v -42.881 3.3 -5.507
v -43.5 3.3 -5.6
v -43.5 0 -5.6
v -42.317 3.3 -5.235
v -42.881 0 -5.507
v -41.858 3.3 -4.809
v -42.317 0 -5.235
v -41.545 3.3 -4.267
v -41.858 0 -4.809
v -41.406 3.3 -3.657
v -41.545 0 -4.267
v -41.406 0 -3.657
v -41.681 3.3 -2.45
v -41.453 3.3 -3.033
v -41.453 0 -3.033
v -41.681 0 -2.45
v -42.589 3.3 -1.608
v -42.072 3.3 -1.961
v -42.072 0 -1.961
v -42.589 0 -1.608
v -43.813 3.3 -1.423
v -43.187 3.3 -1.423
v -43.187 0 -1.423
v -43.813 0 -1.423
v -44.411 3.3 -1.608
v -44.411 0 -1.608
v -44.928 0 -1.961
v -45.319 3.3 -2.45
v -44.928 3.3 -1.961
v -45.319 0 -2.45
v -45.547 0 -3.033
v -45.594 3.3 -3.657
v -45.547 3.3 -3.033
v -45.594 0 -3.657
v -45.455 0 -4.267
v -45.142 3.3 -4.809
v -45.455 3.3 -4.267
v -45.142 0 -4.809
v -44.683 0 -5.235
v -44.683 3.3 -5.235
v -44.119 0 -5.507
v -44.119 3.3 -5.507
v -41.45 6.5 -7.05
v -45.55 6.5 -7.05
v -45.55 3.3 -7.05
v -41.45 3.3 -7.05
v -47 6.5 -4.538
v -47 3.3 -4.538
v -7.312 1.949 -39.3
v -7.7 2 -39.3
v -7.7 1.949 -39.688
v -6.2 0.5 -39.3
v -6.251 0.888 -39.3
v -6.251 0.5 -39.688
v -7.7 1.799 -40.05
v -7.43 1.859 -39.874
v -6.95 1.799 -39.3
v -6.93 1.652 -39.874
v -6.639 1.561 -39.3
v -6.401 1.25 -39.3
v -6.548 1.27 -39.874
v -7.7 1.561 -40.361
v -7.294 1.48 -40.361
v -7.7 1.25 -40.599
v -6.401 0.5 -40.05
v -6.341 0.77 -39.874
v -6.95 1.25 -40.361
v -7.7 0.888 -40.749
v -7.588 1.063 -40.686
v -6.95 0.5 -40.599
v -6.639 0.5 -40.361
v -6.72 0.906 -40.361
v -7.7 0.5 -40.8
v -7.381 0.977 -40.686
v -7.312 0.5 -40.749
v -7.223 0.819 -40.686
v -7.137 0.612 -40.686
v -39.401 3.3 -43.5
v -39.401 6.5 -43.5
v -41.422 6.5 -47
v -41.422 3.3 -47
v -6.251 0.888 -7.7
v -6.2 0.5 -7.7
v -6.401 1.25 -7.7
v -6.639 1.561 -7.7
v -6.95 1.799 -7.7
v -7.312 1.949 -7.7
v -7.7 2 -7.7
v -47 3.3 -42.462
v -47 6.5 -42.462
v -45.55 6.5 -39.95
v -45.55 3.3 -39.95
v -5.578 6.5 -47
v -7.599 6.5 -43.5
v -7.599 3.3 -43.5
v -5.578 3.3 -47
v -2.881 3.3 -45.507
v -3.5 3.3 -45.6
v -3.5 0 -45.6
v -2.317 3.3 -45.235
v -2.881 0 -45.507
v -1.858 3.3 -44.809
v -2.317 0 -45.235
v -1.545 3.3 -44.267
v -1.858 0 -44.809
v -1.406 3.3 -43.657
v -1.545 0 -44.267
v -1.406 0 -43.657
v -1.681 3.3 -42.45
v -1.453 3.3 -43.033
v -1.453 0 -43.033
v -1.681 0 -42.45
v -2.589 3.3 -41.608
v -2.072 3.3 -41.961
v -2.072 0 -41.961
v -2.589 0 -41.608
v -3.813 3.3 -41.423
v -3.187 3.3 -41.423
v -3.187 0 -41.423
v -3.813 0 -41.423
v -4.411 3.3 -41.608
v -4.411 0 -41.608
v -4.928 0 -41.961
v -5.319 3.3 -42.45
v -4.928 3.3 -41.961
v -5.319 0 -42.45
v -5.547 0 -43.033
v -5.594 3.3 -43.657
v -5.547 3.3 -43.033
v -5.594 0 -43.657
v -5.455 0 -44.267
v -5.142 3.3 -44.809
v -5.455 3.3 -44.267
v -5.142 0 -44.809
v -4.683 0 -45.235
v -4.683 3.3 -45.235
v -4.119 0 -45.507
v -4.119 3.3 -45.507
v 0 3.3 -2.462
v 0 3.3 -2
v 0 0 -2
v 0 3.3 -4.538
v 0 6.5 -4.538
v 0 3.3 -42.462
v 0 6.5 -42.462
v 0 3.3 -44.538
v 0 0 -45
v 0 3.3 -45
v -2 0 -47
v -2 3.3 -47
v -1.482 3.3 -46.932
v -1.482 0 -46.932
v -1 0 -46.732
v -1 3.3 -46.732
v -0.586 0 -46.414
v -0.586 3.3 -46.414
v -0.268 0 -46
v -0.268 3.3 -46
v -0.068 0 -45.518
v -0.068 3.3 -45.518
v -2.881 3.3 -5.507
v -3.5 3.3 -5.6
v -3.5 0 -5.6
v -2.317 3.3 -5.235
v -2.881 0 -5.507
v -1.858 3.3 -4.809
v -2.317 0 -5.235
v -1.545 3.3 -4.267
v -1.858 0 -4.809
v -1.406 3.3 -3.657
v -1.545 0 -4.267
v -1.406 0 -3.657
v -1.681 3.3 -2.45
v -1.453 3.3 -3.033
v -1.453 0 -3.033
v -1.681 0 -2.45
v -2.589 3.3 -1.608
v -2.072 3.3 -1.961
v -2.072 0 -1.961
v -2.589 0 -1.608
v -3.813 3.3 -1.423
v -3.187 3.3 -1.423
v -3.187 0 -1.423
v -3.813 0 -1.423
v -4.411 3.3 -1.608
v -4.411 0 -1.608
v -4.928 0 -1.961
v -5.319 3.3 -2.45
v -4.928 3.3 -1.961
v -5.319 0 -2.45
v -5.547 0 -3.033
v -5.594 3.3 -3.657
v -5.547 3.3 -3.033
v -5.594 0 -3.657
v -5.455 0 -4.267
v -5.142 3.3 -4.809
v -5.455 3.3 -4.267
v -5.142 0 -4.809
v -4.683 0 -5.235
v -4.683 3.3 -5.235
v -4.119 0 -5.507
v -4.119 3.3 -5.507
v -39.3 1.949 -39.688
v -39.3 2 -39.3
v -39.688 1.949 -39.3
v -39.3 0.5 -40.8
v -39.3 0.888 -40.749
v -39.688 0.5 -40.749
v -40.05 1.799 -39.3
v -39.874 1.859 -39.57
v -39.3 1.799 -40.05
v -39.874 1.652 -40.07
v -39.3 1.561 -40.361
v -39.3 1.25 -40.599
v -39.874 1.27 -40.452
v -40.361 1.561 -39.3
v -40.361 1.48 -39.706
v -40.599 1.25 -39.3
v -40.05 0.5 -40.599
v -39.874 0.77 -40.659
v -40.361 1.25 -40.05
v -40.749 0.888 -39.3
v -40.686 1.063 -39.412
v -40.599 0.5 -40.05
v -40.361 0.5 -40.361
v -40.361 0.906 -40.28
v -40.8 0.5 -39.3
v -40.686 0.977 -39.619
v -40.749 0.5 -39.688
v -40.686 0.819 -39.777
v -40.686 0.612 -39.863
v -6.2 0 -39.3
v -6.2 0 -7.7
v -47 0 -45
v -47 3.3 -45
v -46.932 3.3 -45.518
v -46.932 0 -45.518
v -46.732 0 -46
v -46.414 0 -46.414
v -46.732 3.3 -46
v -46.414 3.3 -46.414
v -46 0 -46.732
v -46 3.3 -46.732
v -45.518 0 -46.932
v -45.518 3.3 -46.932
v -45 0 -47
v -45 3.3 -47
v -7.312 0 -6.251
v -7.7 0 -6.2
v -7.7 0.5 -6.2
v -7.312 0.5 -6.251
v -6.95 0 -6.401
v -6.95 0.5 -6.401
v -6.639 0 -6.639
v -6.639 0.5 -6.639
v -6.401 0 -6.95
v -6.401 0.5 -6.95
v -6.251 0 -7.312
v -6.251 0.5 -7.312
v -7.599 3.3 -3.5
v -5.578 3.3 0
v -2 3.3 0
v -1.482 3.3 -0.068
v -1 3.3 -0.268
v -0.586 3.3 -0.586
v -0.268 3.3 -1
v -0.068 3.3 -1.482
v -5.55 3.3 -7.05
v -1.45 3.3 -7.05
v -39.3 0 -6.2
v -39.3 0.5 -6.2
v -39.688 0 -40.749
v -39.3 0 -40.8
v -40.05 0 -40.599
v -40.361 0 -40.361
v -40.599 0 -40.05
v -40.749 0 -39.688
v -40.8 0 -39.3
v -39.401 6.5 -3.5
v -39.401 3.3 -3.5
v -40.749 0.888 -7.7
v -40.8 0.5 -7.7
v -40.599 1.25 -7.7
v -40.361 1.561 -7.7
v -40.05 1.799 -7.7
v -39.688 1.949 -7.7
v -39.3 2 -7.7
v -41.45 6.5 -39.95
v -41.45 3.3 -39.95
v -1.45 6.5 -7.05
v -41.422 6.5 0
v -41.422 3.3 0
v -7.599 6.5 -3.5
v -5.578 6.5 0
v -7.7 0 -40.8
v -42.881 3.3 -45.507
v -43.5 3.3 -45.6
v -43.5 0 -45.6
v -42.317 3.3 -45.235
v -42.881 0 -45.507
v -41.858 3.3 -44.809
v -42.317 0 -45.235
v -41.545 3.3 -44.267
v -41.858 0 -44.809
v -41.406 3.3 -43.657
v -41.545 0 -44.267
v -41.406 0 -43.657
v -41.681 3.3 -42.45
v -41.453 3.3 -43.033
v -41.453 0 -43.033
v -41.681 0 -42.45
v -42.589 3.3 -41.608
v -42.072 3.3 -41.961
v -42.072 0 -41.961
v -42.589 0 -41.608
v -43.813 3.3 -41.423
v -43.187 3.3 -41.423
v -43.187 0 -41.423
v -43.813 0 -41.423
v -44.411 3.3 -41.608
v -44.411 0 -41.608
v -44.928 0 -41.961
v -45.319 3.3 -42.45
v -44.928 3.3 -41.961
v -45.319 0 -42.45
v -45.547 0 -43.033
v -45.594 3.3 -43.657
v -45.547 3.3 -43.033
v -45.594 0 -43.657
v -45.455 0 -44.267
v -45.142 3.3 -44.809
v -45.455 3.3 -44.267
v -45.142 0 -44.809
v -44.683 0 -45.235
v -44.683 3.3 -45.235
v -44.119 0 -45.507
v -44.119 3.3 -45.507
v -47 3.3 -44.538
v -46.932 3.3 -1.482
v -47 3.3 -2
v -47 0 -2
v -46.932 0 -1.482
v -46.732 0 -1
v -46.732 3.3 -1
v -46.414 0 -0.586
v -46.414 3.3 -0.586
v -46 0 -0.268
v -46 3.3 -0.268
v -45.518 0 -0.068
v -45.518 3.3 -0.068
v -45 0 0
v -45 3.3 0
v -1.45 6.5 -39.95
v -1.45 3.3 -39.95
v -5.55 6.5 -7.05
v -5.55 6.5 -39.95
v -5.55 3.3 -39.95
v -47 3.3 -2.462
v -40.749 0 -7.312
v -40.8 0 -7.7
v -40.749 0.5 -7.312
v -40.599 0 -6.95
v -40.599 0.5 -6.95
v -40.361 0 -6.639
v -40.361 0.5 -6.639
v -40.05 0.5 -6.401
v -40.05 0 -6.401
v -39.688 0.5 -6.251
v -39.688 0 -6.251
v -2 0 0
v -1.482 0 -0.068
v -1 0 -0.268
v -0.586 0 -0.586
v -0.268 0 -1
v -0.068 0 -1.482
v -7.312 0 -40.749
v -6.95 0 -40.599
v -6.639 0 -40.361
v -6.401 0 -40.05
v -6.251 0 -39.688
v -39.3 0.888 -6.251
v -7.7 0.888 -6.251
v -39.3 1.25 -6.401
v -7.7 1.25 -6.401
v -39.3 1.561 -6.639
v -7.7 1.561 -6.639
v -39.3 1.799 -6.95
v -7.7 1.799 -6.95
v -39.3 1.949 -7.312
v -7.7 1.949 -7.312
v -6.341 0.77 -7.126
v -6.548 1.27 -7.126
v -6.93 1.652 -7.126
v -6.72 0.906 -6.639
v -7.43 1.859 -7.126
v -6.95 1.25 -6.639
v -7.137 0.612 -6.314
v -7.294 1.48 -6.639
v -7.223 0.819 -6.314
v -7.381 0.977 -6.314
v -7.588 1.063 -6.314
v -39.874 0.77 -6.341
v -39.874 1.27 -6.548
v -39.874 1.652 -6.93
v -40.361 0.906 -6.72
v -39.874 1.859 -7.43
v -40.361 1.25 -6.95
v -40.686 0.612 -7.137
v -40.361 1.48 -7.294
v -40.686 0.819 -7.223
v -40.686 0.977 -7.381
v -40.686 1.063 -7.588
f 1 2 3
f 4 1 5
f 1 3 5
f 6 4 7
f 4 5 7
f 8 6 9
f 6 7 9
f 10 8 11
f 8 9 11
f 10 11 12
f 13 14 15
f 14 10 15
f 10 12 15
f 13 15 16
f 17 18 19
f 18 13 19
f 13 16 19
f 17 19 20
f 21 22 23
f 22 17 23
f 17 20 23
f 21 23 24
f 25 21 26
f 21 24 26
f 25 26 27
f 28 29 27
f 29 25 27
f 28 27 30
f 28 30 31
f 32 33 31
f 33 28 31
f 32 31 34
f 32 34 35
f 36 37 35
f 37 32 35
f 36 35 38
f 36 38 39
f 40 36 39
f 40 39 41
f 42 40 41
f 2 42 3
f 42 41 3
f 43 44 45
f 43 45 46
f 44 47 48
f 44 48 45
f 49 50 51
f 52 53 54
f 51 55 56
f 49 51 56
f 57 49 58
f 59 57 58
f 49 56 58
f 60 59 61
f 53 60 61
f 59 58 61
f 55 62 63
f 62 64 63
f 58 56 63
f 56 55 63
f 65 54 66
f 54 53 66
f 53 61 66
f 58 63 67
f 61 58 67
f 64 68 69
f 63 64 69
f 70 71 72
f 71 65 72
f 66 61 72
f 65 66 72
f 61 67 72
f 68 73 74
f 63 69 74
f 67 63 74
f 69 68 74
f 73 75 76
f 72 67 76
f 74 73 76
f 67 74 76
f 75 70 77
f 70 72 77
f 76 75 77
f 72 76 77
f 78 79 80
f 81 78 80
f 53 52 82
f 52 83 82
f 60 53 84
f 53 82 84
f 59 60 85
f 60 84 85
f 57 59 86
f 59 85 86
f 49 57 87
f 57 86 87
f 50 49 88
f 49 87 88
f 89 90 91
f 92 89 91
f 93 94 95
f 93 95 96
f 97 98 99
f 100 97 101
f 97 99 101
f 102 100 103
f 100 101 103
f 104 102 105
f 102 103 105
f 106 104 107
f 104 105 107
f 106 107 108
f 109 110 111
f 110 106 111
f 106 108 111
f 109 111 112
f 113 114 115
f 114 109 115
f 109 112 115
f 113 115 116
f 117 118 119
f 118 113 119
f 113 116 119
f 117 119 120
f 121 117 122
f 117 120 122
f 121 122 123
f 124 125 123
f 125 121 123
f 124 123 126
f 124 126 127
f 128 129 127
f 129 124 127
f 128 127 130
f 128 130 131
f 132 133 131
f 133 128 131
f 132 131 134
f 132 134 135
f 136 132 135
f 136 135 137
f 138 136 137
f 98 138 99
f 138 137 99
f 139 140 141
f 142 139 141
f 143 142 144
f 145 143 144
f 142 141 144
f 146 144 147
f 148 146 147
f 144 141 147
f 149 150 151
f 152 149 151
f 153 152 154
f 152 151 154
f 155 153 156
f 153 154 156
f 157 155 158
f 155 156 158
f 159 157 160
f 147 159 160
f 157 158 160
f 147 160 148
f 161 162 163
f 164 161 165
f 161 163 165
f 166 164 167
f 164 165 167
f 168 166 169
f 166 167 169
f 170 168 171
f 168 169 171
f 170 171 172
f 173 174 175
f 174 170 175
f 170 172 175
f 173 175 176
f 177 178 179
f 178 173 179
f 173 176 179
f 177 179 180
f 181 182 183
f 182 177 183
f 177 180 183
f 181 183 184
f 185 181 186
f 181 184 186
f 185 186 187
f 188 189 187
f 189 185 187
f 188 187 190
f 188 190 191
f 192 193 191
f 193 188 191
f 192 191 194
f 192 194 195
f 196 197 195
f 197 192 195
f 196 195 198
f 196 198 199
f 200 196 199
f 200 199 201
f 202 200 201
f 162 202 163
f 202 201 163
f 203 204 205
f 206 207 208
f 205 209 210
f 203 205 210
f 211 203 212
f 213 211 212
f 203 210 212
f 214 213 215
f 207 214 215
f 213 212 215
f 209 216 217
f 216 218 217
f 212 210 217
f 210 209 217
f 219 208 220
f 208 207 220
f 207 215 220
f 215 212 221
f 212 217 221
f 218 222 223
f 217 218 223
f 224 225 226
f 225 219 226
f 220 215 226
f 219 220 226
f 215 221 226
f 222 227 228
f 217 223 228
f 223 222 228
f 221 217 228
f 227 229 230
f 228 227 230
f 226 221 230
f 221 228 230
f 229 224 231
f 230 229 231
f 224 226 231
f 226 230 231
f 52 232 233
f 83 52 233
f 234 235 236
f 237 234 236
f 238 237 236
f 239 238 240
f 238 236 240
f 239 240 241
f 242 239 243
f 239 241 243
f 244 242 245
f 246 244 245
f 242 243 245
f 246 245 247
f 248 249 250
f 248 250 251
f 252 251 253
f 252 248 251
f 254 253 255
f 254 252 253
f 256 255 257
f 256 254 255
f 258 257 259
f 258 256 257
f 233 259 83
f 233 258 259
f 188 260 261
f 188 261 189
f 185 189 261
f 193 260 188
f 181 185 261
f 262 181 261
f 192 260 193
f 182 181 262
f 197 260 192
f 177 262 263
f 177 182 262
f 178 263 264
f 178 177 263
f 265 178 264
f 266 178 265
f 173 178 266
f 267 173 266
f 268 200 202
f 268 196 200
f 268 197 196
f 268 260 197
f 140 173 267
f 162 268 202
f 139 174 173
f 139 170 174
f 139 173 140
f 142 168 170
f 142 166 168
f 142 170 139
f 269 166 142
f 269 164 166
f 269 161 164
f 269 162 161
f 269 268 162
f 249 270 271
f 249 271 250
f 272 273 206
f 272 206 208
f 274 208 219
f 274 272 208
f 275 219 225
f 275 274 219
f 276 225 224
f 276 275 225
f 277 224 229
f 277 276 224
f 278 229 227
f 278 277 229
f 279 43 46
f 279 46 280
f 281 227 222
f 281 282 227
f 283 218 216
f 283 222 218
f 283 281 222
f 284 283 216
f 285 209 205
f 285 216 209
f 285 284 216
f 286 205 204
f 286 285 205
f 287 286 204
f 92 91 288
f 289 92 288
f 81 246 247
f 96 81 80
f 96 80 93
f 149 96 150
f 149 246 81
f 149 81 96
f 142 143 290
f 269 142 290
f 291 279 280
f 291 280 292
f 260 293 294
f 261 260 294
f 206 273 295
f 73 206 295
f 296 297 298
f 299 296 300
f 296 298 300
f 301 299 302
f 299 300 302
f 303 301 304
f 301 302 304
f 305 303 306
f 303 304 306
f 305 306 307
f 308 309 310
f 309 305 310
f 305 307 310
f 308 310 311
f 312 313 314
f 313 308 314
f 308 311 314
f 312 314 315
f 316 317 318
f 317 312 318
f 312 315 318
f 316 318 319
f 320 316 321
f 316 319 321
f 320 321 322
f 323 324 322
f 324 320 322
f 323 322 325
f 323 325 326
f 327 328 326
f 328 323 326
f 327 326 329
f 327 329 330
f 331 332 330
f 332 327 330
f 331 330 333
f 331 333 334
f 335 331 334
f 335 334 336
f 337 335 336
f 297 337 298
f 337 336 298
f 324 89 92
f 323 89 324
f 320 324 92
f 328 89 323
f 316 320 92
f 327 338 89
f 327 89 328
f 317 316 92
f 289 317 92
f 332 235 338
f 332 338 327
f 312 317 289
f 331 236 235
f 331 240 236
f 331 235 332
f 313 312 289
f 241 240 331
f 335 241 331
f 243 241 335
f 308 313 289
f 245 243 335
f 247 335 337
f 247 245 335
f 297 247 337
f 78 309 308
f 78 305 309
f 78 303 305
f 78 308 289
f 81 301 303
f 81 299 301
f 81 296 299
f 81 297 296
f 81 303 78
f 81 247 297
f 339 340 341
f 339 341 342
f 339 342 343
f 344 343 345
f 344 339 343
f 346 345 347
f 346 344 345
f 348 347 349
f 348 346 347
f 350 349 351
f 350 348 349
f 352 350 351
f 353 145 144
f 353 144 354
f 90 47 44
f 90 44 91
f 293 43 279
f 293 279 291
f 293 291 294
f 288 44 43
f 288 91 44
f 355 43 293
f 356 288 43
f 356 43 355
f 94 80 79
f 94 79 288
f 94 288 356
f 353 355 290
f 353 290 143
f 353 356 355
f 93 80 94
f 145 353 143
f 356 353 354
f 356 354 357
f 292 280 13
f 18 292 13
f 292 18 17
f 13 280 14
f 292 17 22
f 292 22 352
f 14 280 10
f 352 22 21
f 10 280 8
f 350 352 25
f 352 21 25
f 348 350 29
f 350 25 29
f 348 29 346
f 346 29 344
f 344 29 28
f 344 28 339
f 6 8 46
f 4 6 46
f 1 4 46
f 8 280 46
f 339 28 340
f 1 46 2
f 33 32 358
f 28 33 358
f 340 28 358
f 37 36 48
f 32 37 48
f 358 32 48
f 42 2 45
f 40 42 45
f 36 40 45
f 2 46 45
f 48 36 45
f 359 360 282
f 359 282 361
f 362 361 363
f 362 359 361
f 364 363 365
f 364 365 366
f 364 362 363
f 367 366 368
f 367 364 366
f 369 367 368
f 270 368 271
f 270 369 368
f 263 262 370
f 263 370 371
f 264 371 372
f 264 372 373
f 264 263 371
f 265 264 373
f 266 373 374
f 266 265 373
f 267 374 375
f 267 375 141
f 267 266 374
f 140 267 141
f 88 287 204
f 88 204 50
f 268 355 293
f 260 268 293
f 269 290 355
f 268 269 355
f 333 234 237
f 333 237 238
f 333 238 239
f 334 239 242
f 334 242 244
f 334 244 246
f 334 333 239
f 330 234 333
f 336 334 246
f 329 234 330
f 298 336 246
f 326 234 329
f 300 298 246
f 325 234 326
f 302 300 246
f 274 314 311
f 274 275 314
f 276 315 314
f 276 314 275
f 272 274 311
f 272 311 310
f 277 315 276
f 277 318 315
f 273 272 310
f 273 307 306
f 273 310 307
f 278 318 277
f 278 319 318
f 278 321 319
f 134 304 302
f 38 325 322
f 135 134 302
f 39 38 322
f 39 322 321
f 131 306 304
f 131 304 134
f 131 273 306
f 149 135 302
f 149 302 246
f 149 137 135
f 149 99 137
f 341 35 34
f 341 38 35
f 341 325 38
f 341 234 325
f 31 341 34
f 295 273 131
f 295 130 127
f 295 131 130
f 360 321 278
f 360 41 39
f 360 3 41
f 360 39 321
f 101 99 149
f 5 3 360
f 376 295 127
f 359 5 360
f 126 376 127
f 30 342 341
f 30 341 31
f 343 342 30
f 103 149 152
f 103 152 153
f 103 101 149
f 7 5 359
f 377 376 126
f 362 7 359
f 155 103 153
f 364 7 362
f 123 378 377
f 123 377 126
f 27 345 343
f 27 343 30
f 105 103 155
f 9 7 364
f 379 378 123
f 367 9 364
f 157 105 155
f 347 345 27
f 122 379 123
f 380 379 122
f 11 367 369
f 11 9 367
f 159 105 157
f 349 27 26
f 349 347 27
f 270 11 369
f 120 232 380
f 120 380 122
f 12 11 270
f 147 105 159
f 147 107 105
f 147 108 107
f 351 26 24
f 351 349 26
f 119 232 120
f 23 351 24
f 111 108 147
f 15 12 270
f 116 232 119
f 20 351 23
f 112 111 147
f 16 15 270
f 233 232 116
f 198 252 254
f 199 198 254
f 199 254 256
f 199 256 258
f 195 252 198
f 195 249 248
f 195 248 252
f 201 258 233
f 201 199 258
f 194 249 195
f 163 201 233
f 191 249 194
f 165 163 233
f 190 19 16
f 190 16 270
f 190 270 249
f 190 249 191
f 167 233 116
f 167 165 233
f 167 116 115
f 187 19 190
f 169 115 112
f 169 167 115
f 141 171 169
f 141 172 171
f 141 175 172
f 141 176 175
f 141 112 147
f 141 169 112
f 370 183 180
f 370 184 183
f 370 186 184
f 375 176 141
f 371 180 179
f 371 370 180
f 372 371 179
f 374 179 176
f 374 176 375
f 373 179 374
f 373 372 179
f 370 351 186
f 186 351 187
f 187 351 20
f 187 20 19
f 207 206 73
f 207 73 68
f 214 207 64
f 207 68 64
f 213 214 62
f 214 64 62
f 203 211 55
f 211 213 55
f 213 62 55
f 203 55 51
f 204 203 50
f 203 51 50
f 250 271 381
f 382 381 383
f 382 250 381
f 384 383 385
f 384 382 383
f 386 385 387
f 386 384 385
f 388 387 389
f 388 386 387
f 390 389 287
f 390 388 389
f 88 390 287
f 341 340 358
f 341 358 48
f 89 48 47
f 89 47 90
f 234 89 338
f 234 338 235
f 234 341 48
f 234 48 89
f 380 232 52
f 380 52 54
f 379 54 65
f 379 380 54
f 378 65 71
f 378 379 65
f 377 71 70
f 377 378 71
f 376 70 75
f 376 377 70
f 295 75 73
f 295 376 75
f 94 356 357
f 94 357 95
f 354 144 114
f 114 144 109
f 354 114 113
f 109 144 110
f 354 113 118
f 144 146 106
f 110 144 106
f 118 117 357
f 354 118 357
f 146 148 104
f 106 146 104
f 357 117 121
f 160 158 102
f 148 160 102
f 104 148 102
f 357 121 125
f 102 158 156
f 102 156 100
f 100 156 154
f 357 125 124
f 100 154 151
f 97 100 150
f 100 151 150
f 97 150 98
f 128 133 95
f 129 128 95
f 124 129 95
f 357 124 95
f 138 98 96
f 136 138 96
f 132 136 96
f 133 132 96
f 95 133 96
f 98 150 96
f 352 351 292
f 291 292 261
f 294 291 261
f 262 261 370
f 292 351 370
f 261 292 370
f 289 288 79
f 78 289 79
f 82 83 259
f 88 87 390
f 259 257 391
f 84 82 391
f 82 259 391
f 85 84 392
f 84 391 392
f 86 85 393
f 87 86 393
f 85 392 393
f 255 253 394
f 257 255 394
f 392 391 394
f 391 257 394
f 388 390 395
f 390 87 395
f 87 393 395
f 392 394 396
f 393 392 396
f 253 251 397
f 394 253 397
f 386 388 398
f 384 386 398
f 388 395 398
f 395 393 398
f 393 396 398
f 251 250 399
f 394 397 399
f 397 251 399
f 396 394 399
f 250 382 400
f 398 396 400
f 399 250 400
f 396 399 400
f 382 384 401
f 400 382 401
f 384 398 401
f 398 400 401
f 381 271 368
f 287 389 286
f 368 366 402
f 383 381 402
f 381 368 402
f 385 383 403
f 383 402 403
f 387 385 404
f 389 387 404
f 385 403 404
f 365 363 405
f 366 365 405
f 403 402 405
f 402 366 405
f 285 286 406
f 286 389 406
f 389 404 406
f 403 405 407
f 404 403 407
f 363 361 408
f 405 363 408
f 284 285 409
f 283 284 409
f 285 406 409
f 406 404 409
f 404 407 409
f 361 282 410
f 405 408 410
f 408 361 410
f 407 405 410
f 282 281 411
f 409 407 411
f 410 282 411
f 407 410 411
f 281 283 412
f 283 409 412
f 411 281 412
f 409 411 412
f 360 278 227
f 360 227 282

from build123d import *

# Parameters (mm, degrees)
SKETCH_1_W          = 47
SKETCH_1_H          = 47
EXTRUDE_1_DEPTH     = 6.5
SKETCH_2_R          = 2.1
CUT_EXTRUDE_1_DEPTH = 67.785103129
SKETCH_3_W          = 34.6
SKETCH_3_H          = 34.6
CUT_EXTRUDE_2_DEPTH = 2
FILLET_1_R          = 2
FILLET_2_R          = 1.5
FILLET_3_R          = 1.5
CUT_EXTRUDE_3_DEPTH = 3.2
SKETCH_5_W          = 3.789230485
SKETCH_5_H          = 3.5
CUT_EXTRUDE_4_DEPTH = 3.2


with BuildPart() as part:
    # Эскиз1 → Бобышка-Вытянуть1 (new body)
    with BuildSketch(Plane(origin=(0, 0, 0), x_dir=(1, 0, 0), z_dir=(0, 1, 0))):
        with Locations((-23.5, 23.5)):
            Rectangle(SKETCH_1_W, SKETCH_1_H)
    extrude(amount=EXTRUDE_1_DEPTH)

    # Эскиз2 → Вырез-Вытянуть1 (cut, through all)
    with BuildSketch(Plane.XZ):
        with Locations(Location((-43.5, -3.5, 0), (0, 0, 270))):
            Circle(SKETCH_2_R)
        with Locations(Location((-3.5, -3.5, 0), (0, 0, 270))):
            Circle(SKETCH_2_R)
        with Locations(Location((-3.5, -43.5, 0), (0, 0, 270))):
            Circle(SKETCH_2_R)
        with Locations(Location((-43.5, -43.5, 0), (0, 0, 270))):
            Circle(SKETCH_2_R)
    extrude(amount=-CUT_EXTRUDE_1_DEPTH, mode=Mode.SUBTRACT)

    # Эскиз3 → Вырез-Вытянуть2 (cut)
    with BuildSketch(Plane.XZ):
        with Locations((-23.5, -23.5)):
            Rectangle(SKETCH_3_W, SKETCH_3_H)
    extrude(amount=-CUT_EXTRUDE_2_DEPTH, mode=Mode.SUBTRACT)

    # Скругление1
    fillet_1_edges = [part.edges().sort_by_distance(p)[0] for p in [
        (0, 3.25, 0),
        (-47, 3.25, 0),
        (-47, 3.25, -47),
        (0, 3.25, -47),
    ]]
    fillet(fillet_1_edges, radius=FILLET_1_R)

    # Скругление2
    fillet_2_edges = [part.edges().sort_by_distance(p)[0] for p in [
        (-40.8, 2, -23.5),
        (-23.5, 2, -6.2),
        (-6.2, 2, -23.5),
        (-23.5, 2, -40.8),
    ]]
    fillet(fillet_2_edges, radius=FILLET_2_R)

    # Скругление3
    # the kernel refuses this fillet: 1.5 mm, written as the material it adds along each edge
    with BuildSketch(Plane(origin=(-39.3, 0.5, -39.3), x_dir=(0, 0, -1), z_dir=(-1, 0, 0))) as fillet_3_piece_1_section:
        Polygon((0, 0), (FILLET_3_R, 0), (FILLET_3_R, -FILLET_3_R), (0, -FILLET_3_R), align=None)
    fillet_3_piece_1 = extrude(amount=FILLET_3_R, mode=Mode.PRIVATE)
    fillet_3_piece_1 = fillet_3_piece_1 - Plane(origin=(-39.3, 0.5, -39.3), x_dir=(0, -0.7071067811865475, 0.7071067811865475), z_dir=(-1, 0, 0)) * Sphere(FILLET_3_R, mode=Mode.PRIVATE)
    add(fillet_3_piece_1)
    with BuildSketch(Plane(origin=(-39.3, 0.5, -7.7), x_dir=(0, 0, 1), z_dir=(-1, 0, 0))) as fillet_3_piece_2_section:
        Polygon((0, 0), (FILLET_3_R, 0), (FILLET_3_R, FILLET_3_R), (0, FILLET_3_R), align=None)
    fillet_3_piece_2 = extrude(amount=FILLET_3_R, mode=Mode.PRIVATE)
    fillet_3_piece_2 = fillet_3_piece_2 - Plane(origin=(-39.3, 0.5, -7.7), x_dir=(0, -0.7071067811865475, -0.7071067811865475), z_dir=(-1, 0, 0)) * Sphere(FILLET_3_R, mode=Mode.PRIVATE)
    add(fillet_3_piece_2)
    with BuildSketch(Plane(origin=(-7.7, 0.5, -39.3), x_dir=(1, 0, 0), z_dir=(0, 0, -1))) as fillet_3_piece_3_section:
        Polygon((0, 0), (FILLET_3_R, 0), (FILLET_3_R, -FILLET_3_R), (0, -FILLET_3_R), align=None)
    fillet_3_piece_3 = extrude(amount=FILLET_3_R, mode=Mode.PRIVATE)
    fillet_3_piece_3 = fillet_3_piece_3 - Plane(origin=(-7.7, 0.5, -39.3), x_dir=(-0.7071067811865475, -0.7071067811865475, 0), z_dir=(0, 0, -1)) * Sphere(FILLET_3_R, mode=Mode.PRIVATE)
    add(fillet_3_piece_3)
    with BuildSketch(Plane(origin=(-7.7, 0.5, -7.7), x_dir=(1, 0, 0), z_dir=(0, 0, 1))) as fillet_3_piece_4_section:
        Polygon((0, 0), (FILLET_3_R, 0), (FILLET_3_R, FILLET_3_R), (0, FILLET_3_R), align=None)
    fillet_3_piece_4 = extrude(amount=FILLET_3_R, mode=Mode.PRIVATE)
    fillet_3_piece_4 = fillet_3_piece_4 - Plane(origin=(-7.7, 0.5, -7.7), x_dir=(-0.7071067811865475, -0.7071067811865475, 0), z_dir=(0, 0, 1)) * Sphere(FILLET_3_R, mode=Mode.PRIVATE)
    add(fillet_3_piece_4)
    with BuildSketch(Plane(origin=(-6.2, 0, -6.2), x_dir=(-1, 0, 0), z_dir=(0, 1, 0)), Plane(origin=(-40.8, 0, -6.2), x_dir=(0, 0, -1), z_dir=(0, 1, 0))) as fillet_3_piece_5:
        with BuildLine():
            CenterArc((FILLET_3_R, -FILLET_3_R), FILLET_3_R, 90, 90)
            Line((0, -FILLET_3_R), (0, 0))
            Line((0, 0), (FILLET_3_R, 0))
        make_face()
    extrude(amount=0.5)
    with BuildSketch(Plane(origin=(-6.2, 0, -40.8), x_dir=(-1, 0, 0), z_dir=(0, 1, 0)), Plane(origin=(-40.8, 0, -40.8), x_dir=(0, 0, 1), z_dir=(0, 1, 0))) as fillet_3_piece_6:
        with BuildLine():
            CenterArc((FILLET_3_R, FILLET_3_R), FILLET_3_R, 180, 90)
            Line((0, FILLET_3_R), (0, 0))
            Line((0, 0), (FILLET_3_R, 0))
        make_face()
    extrude(amount=0.5)

    # Эскиз4 → Вырез-Вытянуть3 (cut)
    with BuildSketch(Plane(origin=(0, 6.5, 0), x_dir=(1, 0, 0), z_dir=(0, 1, 0))):
        Polygon((-5.549593456, 39.95), (-7.599186911, 43.5), (-5.549593456, 47.05), (-1.450406544, 47.05), (0.599186911, 43.5), (-1.450406544, 39.95), align=None)
        Polygon((-39.400813089, 43.5), (-41.450406544, 47.05), (-45.549593456, 47.05), (-47.599186911, 43.5), (-45.549593456, 39.95), (-41.450406544, 39.95), align=None)
        Polygon((-1.450406544, 7.05), (-5.549593456, 7.05), (-7.599186911, 3.5), (-5.549593456, -0.05), (-1.450406544, -0.05), (0.599186911, 3.5), align=None)
        Polygon((-41.450406544, 7.05), (-39.400813089, 3.5), (-41.450406544, -0.05), (-45.549593456, -0.05), (-47.599186911, 3.5), (-45.549593456, 7.05), align=None)
    extrude(amount=-CUT_EXTRUDE_3_DEPTH, mode=Mode.SUBTRACT)

    # Эскиз5 → Вырез-Вытянуть4 (cut)
    with BuildSketch(Plane(origin=(0, 6.5, 0), x_dir=(1, 0, 0), z_dir=(0, 1, 0))):
        with Locations((-45.105384758, 45.25)):
            Rectangle(SKETCH_5_W, SKETCH_5_H)
        with Locations((-1.894615243, 45.25)):
            Rectangle(SKETCH_5_W, SKETCH_5_H)
        with Locations((-45.105384758, 1.75)):
            Rectangle(SKETCH_5_W, SKETCH_5_H)
        with Locations((-1.894615243, 1.75)):
            Rectangle(SKETCH_5_W, SKETCH_5_H)
    extrude(amount=-CUT_EXTRUDE_4_DEPTH, mode=Mode.SUBTRACT)


solid = part.part
